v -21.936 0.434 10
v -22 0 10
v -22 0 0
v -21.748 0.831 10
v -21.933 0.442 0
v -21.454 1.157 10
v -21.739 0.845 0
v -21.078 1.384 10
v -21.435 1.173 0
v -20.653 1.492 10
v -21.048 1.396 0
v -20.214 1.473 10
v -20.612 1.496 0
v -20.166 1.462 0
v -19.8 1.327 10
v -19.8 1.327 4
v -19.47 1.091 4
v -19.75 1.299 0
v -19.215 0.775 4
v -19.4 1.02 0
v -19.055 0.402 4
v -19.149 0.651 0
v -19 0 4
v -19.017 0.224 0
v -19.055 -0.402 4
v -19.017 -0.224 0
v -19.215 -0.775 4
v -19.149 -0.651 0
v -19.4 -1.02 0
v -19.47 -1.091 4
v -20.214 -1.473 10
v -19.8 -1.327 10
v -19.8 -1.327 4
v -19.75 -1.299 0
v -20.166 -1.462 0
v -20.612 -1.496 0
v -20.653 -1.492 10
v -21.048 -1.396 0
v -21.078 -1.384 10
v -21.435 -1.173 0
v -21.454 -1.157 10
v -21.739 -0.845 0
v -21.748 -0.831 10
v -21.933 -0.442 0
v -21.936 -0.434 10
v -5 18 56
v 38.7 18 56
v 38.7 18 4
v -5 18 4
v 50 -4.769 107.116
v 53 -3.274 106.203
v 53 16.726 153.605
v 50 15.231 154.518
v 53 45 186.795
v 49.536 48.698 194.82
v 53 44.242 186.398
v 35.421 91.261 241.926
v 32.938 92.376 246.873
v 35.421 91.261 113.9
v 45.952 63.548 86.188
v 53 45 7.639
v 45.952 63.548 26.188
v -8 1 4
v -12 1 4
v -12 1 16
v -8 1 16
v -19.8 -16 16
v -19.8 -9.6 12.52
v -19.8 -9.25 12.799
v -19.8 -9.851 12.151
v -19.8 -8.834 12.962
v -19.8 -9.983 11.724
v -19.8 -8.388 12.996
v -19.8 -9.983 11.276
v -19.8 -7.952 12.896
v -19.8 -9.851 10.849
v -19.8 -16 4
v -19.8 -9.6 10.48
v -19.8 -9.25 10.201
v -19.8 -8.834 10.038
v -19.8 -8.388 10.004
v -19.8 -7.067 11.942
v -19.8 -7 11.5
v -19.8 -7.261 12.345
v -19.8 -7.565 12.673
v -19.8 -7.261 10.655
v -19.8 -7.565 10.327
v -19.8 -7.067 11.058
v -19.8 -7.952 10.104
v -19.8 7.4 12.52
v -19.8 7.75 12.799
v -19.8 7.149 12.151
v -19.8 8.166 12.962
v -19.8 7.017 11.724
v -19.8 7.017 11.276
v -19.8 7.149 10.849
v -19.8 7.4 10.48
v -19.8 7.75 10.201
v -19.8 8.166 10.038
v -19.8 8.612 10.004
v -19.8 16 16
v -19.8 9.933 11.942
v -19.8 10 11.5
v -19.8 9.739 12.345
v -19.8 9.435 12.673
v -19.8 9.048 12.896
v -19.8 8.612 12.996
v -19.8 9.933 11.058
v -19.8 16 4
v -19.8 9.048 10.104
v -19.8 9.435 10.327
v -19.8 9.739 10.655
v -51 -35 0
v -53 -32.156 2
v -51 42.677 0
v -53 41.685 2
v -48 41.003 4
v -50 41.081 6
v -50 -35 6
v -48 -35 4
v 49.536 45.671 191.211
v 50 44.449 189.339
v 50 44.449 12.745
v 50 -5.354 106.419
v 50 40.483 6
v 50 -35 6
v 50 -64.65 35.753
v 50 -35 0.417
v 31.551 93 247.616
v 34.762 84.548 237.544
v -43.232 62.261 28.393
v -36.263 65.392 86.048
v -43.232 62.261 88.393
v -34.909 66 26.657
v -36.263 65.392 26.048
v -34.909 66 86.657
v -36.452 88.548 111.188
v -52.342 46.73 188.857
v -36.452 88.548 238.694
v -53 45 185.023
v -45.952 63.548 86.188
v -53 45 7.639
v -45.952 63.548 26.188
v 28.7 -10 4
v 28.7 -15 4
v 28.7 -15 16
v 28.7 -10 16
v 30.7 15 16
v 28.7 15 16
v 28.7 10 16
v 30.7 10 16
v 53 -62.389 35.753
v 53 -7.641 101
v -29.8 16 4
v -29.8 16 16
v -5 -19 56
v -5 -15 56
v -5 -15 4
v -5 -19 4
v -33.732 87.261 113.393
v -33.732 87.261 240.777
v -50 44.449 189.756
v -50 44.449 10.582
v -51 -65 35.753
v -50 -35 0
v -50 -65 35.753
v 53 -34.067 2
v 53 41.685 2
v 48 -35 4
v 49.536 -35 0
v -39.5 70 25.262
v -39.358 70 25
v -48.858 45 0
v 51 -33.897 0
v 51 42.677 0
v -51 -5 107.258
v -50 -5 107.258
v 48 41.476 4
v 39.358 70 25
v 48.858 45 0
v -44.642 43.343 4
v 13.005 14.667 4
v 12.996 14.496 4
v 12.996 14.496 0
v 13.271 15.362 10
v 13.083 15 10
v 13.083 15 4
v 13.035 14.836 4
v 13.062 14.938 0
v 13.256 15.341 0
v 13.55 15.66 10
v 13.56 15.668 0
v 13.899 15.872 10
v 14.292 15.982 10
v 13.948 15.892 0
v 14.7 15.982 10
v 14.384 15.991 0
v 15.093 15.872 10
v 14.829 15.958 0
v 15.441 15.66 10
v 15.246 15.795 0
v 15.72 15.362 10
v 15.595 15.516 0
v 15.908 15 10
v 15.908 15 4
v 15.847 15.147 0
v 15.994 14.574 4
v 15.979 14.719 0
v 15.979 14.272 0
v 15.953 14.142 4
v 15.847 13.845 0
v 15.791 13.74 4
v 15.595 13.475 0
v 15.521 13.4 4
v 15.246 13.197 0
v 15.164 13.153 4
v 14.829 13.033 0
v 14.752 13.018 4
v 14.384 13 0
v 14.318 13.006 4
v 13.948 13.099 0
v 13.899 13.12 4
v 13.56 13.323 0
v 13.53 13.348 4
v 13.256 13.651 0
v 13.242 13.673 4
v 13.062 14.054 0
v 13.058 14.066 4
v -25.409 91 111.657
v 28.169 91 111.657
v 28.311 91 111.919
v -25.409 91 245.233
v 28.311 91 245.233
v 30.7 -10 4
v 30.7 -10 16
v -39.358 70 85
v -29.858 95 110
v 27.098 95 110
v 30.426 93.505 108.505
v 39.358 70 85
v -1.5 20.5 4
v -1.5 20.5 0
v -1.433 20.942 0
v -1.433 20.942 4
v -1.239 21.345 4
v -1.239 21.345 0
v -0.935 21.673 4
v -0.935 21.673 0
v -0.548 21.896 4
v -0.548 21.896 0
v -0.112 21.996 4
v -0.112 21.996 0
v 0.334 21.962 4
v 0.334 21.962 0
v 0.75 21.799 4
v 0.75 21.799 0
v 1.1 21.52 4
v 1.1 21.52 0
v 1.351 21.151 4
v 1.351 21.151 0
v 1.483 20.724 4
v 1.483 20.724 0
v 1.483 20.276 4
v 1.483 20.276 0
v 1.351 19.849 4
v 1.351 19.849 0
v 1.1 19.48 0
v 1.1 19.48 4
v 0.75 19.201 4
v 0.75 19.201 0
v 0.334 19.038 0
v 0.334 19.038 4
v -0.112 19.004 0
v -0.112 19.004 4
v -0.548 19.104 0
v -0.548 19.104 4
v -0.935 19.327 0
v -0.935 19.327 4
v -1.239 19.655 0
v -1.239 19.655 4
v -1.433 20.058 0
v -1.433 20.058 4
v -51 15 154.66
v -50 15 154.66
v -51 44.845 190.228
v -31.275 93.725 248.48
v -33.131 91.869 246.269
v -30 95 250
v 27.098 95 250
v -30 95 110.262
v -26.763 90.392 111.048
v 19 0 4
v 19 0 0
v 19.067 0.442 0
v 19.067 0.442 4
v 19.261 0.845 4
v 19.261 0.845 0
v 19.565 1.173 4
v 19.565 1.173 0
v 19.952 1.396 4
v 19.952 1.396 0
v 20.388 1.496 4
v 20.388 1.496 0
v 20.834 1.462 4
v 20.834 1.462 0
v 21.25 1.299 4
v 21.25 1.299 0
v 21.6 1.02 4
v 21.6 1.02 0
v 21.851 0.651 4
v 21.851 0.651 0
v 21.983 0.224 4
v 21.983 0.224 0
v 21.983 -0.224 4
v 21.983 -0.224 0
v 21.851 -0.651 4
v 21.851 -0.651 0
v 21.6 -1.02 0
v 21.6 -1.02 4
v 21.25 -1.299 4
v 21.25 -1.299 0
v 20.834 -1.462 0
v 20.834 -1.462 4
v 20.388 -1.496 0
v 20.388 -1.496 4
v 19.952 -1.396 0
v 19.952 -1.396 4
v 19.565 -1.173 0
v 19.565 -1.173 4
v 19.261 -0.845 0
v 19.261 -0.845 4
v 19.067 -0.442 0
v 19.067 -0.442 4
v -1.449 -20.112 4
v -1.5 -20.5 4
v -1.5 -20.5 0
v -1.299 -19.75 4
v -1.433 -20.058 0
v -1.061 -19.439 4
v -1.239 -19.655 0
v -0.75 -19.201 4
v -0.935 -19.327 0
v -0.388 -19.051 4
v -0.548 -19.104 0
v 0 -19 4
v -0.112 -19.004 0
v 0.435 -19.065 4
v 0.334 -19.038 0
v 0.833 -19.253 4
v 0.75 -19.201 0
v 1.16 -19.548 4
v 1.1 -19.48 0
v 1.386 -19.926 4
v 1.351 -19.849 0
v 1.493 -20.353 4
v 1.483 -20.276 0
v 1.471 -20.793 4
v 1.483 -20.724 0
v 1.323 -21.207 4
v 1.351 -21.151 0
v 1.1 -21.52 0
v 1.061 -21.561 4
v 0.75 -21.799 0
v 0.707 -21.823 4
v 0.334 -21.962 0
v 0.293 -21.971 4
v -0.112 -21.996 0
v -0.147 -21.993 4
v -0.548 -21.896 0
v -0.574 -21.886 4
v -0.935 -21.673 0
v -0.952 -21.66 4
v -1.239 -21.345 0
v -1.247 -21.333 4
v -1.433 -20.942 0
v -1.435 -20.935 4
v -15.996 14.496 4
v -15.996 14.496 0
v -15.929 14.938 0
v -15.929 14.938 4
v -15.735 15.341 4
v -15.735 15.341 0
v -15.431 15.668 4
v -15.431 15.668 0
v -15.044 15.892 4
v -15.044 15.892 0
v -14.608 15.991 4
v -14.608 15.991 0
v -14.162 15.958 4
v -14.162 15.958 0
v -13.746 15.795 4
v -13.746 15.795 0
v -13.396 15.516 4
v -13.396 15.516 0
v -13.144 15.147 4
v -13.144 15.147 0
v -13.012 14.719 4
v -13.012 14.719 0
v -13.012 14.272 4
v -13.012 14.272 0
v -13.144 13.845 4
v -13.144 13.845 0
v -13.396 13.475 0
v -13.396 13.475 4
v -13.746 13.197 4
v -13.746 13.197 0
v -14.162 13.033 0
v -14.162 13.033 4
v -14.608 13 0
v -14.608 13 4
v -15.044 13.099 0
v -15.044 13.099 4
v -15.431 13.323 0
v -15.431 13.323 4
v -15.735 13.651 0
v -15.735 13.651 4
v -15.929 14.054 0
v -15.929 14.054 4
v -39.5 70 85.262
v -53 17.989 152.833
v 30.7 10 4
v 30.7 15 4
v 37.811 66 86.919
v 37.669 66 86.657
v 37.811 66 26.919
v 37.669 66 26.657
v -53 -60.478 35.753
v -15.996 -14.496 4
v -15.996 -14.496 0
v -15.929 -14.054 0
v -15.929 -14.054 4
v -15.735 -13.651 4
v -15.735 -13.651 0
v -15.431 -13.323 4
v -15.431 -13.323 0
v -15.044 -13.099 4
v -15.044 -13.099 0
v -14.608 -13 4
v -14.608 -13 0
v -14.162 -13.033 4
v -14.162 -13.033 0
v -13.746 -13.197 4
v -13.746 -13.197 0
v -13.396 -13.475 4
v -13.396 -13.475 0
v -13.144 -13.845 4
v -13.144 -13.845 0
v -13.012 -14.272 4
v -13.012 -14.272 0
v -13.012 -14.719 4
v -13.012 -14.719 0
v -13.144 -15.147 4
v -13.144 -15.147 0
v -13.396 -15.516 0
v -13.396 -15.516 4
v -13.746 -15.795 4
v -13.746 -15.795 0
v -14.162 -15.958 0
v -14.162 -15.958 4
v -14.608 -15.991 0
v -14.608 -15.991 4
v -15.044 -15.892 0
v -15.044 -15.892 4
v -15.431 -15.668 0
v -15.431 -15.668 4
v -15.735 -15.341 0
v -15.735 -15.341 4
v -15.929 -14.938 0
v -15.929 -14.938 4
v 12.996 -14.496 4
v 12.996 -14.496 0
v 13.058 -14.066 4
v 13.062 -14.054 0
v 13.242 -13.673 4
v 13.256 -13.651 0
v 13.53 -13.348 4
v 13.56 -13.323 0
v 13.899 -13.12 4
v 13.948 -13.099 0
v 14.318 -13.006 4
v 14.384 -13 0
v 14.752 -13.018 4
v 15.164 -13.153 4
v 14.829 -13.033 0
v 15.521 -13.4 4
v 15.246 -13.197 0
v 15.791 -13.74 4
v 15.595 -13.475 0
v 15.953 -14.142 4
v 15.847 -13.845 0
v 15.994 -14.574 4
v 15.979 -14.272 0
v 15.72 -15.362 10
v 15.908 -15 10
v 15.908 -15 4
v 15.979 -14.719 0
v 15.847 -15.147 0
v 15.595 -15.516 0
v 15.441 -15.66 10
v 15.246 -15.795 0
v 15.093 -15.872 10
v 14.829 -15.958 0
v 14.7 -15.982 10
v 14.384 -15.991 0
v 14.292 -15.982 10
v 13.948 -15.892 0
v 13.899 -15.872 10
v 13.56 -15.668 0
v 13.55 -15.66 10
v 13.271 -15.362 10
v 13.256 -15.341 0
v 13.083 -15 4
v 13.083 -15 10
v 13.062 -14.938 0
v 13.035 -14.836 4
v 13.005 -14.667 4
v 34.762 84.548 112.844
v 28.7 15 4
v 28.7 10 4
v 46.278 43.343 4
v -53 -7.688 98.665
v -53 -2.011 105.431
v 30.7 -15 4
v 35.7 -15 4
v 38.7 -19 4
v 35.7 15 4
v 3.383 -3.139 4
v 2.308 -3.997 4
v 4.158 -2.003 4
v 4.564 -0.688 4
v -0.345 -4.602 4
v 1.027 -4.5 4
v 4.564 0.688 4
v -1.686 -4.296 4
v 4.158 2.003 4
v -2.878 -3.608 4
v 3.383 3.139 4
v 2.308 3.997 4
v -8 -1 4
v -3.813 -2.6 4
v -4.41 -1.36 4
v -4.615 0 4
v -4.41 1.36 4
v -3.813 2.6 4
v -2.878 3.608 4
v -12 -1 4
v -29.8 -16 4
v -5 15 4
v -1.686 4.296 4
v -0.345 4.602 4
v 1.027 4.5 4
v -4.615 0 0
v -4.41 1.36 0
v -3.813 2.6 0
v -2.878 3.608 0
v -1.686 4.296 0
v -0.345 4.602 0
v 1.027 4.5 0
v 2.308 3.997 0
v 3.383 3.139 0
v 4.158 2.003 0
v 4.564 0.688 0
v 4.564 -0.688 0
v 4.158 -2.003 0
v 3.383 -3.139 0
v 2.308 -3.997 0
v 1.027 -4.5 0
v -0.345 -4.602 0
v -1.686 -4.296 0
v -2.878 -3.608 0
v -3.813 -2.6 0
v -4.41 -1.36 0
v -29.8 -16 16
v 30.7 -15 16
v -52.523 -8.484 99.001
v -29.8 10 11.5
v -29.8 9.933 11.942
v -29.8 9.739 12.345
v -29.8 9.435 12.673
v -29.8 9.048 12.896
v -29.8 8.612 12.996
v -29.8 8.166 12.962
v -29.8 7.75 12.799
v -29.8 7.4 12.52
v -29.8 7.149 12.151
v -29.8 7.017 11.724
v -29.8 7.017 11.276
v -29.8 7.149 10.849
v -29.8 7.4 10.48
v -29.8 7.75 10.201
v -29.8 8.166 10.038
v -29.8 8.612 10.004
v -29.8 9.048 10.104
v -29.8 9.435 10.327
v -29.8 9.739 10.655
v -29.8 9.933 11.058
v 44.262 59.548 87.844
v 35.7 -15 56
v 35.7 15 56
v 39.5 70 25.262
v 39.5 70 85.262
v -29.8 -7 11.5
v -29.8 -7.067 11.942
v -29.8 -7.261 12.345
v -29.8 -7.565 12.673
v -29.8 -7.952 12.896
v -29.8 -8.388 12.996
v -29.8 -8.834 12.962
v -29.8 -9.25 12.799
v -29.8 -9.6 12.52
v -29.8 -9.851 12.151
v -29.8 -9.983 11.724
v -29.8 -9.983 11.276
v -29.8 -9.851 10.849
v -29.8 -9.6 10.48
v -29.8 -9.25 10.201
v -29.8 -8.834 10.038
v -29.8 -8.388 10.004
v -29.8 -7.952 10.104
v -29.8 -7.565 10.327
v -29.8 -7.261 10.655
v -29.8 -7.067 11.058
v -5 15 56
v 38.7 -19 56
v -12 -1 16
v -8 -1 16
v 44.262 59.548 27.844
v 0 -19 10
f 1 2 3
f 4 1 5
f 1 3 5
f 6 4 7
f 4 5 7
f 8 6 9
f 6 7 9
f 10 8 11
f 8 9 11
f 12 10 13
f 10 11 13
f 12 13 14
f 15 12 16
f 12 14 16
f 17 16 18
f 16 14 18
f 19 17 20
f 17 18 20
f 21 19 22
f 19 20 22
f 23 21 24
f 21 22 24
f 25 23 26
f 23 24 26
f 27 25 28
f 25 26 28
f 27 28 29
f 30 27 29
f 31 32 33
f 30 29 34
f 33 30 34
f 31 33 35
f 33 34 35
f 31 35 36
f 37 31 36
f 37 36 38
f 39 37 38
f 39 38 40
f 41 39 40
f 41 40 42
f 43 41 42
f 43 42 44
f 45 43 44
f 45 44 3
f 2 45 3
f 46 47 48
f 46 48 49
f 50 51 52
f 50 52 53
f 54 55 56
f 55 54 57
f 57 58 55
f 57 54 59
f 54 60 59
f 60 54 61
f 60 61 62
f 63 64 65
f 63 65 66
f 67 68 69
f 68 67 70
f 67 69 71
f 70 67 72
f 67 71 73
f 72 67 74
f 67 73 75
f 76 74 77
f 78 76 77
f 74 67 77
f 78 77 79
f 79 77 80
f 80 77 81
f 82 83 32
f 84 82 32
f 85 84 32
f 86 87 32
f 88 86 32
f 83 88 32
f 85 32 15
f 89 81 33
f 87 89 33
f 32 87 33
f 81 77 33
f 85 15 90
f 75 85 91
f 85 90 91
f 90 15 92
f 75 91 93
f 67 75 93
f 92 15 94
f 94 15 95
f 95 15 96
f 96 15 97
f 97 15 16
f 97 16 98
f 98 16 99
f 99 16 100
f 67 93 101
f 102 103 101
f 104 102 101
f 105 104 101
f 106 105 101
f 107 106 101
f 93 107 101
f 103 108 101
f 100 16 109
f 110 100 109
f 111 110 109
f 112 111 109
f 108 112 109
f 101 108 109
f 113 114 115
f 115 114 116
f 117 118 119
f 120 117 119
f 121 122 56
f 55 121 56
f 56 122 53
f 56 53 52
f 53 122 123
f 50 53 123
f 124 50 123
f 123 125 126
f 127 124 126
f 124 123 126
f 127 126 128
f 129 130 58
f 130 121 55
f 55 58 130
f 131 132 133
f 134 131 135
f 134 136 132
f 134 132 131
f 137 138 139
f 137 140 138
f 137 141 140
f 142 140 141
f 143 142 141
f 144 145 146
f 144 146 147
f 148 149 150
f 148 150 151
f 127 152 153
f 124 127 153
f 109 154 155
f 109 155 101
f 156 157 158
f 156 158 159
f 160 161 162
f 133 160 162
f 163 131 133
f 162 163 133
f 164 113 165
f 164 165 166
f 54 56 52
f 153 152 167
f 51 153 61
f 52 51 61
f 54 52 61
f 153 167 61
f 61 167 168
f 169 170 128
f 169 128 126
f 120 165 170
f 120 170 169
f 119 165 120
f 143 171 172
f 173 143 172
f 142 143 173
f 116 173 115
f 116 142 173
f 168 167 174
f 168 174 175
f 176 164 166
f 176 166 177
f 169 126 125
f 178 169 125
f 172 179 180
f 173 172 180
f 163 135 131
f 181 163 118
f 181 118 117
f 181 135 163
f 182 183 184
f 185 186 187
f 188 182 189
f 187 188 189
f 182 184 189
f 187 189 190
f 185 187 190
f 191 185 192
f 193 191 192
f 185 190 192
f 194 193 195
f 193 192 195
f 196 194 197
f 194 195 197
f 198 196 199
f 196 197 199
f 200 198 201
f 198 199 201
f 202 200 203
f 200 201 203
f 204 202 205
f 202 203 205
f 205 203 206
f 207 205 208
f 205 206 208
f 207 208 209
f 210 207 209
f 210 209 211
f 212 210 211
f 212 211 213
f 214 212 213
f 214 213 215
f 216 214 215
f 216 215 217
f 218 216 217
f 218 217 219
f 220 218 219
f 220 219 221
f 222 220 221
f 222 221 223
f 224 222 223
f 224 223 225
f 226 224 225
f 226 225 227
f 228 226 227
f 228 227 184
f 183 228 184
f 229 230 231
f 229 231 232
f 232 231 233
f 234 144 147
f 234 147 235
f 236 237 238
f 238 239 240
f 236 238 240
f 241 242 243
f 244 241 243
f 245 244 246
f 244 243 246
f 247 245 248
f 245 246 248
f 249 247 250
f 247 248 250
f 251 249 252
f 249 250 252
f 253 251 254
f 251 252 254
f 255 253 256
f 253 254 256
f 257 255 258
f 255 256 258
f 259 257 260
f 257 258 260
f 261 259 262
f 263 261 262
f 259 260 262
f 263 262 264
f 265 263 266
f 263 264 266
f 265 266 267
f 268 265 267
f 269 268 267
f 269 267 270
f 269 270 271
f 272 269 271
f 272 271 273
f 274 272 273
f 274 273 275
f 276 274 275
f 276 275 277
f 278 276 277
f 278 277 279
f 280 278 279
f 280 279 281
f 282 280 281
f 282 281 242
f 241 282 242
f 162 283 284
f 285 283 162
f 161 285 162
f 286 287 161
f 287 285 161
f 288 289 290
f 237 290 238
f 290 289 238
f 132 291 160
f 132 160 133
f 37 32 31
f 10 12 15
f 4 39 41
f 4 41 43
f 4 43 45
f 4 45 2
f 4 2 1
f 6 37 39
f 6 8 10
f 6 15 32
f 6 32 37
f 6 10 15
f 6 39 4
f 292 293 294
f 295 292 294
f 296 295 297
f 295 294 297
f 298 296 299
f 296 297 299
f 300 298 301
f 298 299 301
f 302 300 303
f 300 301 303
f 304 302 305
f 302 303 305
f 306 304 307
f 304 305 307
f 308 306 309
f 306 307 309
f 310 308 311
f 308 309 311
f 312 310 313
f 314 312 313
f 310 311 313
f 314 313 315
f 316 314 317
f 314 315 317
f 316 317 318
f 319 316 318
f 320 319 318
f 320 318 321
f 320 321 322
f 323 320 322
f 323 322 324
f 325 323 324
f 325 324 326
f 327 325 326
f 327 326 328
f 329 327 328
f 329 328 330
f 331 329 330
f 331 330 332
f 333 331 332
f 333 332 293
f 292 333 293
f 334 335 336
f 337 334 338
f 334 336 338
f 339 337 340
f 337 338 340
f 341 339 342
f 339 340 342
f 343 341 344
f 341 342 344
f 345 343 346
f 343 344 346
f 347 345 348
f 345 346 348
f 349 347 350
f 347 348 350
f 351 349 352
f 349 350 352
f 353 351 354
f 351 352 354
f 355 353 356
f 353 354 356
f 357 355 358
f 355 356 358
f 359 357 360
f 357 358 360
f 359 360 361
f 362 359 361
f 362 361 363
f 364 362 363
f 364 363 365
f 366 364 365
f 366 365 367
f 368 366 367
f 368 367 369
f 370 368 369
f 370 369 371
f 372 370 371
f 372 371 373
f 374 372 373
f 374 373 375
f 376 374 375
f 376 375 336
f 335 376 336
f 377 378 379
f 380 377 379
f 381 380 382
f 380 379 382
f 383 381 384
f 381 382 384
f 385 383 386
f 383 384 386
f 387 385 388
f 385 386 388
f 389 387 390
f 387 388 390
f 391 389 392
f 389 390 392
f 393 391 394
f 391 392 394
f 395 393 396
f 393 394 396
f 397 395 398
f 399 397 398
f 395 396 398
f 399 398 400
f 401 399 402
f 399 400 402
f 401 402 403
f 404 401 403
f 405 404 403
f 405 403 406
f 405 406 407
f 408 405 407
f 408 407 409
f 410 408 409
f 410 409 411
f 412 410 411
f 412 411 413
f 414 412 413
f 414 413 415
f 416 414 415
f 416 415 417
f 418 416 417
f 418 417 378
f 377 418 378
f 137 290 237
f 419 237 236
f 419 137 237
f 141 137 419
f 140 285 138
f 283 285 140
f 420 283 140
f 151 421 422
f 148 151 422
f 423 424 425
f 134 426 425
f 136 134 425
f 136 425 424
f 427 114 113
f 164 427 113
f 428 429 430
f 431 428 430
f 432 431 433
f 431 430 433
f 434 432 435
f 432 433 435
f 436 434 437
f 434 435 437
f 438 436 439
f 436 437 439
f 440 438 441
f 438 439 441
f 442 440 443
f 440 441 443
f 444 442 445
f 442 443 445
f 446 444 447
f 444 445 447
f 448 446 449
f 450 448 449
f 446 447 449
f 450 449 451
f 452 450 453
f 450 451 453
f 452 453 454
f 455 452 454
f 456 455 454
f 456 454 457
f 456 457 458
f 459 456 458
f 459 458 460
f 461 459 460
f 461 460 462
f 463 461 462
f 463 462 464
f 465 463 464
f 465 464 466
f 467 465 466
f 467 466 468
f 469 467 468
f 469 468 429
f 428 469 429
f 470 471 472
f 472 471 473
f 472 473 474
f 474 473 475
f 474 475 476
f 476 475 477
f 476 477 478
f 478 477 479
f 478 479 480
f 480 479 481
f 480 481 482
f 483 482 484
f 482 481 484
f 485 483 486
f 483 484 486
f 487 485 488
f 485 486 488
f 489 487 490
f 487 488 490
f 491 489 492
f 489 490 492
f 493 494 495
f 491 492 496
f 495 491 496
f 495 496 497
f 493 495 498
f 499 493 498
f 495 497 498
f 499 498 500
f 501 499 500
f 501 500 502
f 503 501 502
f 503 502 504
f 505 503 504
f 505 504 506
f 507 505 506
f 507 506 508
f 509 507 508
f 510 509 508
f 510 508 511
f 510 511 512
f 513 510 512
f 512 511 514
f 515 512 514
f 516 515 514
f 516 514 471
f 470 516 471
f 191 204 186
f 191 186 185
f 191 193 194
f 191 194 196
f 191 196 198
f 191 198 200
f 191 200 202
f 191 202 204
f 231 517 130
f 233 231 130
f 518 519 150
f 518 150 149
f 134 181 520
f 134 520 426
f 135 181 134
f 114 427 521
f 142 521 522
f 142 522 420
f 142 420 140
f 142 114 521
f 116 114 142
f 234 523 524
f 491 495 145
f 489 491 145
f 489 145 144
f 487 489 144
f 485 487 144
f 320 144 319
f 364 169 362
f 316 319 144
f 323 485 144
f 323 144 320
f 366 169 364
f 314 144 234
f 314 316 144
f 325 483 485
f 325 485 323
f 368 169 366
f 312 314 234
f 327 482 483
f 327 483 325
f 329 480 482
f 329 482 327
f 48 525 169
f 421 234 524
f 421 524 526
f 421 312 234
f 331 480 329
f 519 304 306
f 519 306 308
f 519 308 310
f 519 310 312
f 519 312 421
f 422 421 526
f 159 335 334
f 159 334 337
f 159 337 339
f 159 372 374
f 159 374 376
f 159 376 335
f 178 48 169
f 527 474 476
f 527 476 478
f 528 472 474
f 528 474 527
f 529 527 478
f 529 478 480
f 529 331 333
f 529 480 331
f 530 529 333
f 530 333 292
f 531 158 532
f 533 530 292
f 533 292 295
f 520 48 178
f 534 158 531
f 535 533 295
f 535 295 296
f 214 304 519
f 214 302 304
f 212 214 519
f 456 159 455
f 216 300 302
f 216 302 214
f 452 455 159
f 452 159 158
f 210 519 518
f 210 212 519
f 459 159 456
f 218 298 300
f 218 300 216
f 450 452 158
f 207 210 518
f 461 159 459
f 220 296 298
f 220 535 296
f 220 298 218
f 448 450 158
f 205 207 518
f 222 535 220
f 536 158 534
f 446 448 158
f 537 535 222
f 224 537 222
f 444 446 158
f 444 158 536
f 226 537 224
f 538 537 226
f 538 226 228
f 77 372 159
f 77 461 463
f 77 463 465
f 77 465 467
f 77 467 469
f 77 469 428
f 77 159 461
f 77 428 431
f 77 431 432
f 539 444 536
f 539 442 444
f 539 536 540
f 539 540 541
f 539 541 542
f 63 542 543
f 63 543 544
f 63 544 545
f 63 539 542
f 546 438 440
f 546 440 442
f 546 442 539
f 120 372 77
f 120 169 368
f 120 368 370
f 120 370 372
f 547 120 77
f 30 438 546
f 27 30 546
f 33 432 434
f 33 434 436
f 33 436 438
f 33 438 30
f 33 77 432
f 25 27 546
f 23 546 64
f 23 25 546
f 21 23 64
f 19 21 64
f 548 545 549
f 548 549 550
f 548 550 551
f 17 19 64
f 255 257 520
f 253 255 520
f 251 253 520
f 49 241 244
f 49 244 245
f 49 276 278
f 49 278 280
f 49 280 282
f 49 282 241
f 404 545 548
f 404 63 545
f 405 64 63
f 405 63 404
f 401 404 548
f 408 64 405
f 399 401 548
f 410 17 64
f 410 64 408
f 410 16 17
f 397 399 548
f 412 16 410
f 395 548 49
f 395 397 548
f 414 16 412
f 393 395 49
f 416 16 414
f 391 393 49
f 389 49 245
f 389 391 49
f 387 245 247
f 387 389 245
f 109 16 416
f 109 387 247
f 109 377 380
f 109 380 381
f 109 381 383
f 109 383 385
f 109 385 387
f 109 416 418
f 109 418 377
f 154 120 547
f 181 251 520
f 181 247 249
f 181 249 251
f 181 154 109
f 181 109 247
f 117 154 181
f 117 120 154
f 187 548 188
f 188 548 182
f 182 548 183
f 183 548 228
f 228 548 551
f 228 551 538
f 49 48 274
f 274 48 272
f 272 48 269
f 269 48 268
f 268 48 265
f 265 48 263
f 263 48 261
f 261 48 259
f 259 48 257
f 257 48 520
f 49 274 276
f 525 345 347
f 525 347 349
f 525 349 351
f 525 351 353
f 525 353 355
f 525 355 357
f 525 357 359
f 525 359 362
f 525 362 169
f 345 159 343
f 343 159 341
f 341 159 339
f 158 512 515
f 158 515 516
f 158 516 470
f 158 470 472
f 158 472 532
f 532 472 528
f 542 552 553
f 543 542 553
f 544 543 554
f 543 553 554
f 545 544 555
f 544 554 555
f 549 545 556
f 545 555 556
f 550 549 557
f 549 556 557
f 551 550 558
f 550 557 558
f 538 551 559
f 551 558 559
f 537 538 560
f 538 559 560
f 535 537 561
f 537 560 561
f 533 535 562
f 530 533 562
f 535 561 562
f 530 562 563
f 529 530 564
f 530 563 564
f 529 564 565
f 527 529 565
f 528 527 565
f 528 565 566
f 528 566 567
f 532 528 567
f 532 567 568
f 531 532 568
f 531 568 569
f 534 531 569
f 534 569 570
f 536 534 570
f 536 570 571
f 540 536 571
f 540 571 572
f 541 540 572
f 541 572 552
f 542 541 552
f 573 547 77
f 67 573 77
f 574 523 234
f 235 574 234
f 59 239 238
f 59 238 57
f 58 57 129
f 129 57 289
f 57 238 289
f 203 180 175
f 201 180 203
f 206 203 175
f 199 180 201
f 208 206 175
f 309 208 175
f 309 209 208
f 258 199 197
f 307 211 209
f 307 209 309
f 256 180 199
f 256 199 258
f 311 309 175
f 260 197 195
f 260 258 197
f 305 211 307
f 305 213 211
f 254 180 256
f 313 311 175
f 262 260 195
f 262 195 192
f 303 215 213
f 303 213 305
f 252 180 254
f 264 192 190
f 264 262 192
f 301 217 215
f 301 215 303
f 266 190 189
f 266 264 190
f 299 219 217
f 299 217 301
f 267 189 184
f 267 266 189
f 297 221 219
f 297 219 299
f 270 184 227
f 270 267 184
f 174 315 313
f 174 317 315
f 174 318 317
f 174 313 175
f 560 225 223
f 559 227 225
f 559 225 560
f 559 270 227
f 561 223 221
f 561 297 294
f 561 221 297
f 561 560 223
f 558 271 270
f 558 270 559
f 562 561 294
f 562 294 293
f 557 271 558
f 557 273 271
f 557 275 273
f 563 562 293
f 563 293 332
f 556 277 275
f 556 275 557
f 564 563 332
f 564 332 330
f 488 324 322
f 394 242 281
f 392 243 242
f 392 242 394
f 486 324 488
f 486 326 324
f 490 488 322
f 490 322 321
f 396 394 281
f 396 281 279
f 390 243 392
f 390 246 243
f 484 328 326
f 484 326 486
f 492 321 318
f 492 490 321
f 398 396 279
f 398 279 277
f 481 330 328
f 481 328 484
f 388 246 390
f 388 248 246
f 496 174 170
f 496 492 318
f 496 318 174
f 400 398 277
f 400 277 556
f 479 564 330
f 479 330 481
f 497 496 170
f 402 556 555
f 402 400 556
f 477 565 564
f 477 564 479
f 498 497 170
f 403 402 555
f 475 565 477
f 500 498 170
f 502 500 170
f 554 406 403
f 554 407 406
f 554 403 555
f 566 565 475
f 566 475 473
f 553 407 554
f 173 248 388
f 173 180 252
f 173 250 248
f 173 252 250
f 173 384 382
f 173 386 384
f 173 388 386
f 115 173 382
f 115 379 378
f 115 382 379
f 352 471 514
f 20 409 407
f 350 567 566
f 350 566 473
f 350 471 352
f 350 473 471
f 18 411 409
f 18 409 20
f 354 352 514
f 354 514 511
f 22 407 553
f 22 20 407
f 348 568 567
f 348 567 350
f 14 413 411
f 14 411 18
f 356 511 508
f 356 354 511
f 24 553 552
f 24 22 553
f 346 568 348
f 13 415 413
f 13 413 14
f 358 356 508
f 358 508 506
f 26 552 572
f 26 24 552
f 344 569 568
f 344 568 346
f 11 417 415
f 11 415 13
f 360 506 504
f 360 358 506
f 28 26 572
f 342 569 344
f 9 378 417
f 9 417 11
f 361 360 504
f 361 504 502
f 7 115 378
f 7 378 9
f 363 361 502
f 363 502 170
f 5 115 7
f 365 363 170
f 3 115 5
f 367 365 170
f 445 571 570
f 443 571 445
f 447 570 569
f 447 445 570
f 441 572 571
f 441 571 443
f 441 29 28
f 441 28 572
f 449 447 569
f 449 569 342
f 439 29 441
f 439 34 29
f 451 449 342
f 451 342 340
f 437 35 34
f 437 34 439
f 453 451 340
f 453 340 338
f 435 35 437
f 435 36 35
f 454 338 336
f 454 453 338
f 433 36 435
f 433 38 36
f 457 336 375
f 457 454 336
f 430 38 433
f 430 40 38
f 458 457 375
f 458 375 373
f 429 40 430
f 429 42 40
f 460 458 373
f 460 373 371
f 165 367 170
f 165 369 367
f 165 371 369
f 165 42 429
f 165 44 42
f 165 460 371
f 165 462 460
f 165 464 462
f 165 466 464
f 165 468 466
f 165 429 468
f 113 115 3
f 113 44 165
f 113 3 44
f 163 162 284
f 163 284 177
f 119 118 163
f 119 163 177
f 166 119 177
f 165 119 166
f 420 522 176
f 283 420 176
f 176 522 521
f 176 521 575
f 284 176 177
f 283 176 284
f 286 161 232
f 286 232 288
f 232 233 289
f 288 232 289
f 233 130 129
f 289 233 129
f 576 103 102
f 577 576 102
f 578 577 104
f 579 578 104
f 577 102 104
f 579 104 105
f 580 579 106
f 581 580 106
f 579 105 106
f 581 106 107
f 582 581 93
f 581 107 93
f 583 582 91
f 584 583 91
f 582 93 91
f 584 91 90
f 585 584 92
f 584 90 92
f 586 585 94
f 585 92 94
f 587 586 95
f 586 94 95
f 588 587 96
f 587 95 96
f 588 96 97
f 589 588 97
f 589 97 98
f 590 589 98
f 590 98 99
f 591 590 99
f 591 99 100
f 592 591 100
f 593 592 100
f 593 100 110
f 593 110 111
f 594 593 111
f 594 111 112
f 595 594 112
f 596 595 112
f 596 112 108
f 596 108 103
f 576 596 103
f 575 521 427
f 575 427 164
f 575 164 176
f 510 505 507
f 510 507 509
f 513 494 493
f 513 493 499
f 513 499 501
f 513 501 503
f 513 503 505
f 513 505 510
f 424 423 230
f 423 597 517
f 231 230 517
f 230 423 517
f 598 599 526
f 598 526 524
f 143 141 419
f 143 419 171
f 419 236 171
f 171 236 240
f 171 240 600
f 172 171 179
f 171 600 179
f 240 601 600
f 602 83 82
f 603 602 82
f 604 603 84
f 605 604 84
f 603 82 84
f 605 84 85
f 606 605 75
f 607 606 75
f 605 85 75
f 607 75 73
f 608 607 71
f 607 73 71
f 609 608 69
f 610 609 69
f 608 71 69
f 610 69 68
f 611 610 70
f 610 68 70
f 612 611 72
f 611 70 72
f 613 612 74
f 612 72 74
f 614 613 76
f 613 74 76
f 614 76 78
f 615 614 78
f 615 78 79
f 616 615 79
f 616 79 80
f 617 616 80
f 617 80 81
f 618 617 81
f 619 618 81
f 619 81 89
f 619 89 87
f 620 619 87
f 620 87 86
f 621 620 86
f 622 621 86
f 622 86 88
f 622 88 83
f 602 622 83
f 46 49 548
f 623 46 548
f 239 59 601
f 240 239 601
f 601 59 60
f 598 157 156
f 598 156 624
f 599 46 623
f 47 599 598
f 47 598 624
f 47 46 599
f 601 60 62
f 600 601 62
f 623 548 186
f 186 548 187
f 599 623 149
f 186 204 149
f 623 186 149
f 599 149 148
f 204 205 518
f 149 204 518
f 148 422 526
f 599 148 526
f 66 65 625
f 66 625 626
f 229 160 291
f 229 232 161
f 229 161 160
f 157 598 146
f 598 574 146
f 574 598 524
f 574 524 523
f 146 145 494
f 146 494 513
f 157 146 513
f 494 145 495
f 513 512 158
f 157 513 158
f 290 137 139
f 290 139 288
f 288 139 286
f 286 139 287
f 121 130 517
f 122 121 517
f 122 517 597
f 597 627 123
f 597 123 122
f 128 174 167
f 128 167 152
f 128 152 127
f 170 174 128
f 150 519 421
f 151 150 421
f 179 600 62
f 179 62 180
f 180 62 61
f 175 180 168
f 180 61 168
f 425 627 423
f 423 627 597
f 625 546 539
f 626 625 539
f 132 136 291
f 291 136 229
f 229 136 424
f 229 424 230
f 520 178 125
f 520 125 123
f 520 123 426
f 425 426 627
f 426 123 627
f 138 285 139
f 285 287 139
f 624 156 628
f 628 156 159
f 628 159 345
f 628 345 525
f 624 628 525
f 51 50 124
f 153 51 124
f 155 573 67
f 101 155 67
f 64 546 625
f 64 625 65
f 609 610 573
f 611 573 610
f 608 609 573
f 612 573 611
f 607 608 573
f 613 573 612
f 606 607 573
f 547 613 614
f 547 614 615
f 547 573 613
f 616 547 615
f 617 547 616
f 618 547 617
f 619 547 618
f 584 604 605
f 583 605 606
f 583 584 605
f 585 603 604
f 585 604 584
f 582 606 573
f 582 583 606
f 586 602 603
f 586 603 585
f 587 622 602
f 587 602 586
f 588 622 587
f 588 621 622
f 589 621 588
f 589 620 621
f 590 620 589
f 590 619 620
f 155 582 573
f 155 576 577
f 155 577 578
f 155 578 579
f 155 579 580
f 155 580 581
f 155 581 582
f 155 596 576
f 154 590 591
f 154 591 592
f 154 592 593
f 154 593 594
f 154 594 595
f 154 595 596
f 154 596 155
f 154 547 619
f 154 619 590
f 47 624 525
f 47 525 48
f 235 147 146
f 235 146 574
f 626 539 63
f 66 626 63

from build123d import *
from OCP.BRepFilletAPI import BRepFilletAPI_MakeChamfer

# Parameters (mm, degrees)
EXTRUDE_1_DEPTH          = 250
EXTRUDE_1_2_DEPTH        = 250
CUT_EXTRUDE_1_DEPTH      = 273.642623227
CUT_EXTRUDE_1_DEPTH_BACK = 273.642623227
EXTRUDE_5_REACH          = 274.643
EXTRUDE_6_REACH          = 274.643
EXTRUDE_13_DEPTH         = 52
SKETCH_15_W              = 2
SKETCH_15_H              = 5
SKETCH_15_W_2            = 4
SKETCH_15_H_2            = 2
EXTRUDE_14_DEPTH         = 12
SKETCH_16_W              = 10
SKETCH_16_H              = 32
EXTRUDE_15_DEPTH         = 12
CUT_EXTRUDE_2_REACH      = 279.173
SKETCH_17_R              = 1.5
SKETCH_18_R              = 1.5
SKETCH_18_R_2            = 4.615350253
CUT_EXTRUDE_3_DEPTH      = 10
CHAMFER_1_SIZE           = 3.464101615
CHAMFER_1_SIZE_2         = 2
CHAMFER_1_SIZE_3         = 2.416402179
CHAMFER_2_SIZE           = 4
CHAMFER_2_SIZE2          = 5.580634967
CHAMFER_2_SIZE2_2        = 6.901718256
CHAMFER_4_SIZE           = 2


with BuildPart() as part:
    # 草图2 → 凸台-拉伸1 (new body)
    with BuildSketch(Plane.XY):
        Polygon((-53, 45), (-34, 95), (-30.790701011, 95), (-50, 44.449213187), (-50, -65), (-53, -65), align=None)
    extrude(amount=EXTRUDE_1_DEPTH)


with BuildPart() as body_2:
    # 草图2 → Extrude 1 2 (new body)
    with BuildSketch(Plane.XY):
        Polygon((50, 44.449213187), (50, -65), (53, -65), (53, 45), (34, 95), (30.790701011, 95), align=None)
    extrude(amount=EXTRUDE_1_2_DEPTH)


with BuildPart() as cut_extrude_1_tool:
    # 草图3 → 切除-拉伸1 (new, two sides: drawn at the far end of the back side and taken through both)
    with BuildSketch(Plane(origin=(0, 0, 0), x_dir=(0, 0, -1), z_dir=(1, 0, 0)).offset(-CUT_EXTRUDE_1_DEPTH_BACK)):
        Polygon((0, -35), (-35.752607778, -65), (-107.257823333, -5), (-154.659712592, 15), (-250, 95), (-250, -65), (-250, -69.557889813), (0, -69.557889813), (0, -65), align=None)
        Polygon((-110, 95), (-85, 70), (-25, 70), (0, 45), (0, 95), align=None)
    extrude(amount=CUT_EXTRUDE_1_DEPTH + CUT_EXTRUDE_1_DEPTH_BACK)


with BuildPart() as part_1:
    add(part.part)

    # 切除-拉伸1: cut by cut_extrude_1_tool
    add(cut_extrude_1_tool.part, mode=Mode.SUBTRACT)

    # 草图5<2> → 凸台-拉伸6 (add, up to next)
    with BuildSketch(Plane(origin=(0, 0, 0), x_dir=(0, 0, -1), z_dir=(1, 0, 0)), mode=Mode.PRIVATE) as extrude_6_sk1:
        Polygon((-250, 95), (-110, 95), (-85, 70), (-25, 70), (0, 45), (0, -35), (-4, -35), (-4, 43.343145751), (-26.656854249, 66), (-86.656854249, 66), (-111.656854249, 91), (-245.23298563, 91), align=None)
    extrude_6_tool1 = extrude(extrude_6_sk1.sketch, amount=-EXTRUDE_6_REACH, mode=Mode.PRIVATE) - part_1.part


with BuildPart() as body_2_1:
    add(body_2.part)

    # 切除-拉伸1: cut by cut_extrude_1_tool
    add(cut_extrude_1_tool.part, mode=Mode.SUBTRACT)

    # 草图5 → 凸台-拉伸5 (add, up to next)
    with BuildSketch(Plane(origin=(0, 0, 0), x_dir=(0, 0, -1), z_dir=(1, 0, 0)), mode=Mode.PRIVATE) as extrude_5_sk1:
        Polygon((-250, 95), (-110, 95), (-85, 70), (-25, 70), (0, 45), (0, -35), (-4, -35), (-4, 43.343145751), (-26.656854249, 66), (-86.656854249, 66), (-111.656854249, 91), (-245.23298563, 91), align=None)
    extrude_5_tool1 = extrude(extrude_5_sk1.sketch, amount=EXTRUDE_5_REACH, mode=Mode.PRIVATE) - body_2_1.part
    add(extrude_5_tool1.solids().sort_by_distance((0, 92.182199, 180))[0])


with BuildPart() as part_2:
    add(part_1.part)

    add(body_2_1.part)  # 凸台-拉伸6 merges body 2
    add(extrude_6_tool1.solids().sort_by_distance((0, 92.182199, 180))[0])

    # 草图13 → 凸台-拉伸13 (add)
    with BuildSketch(Plane.XY.offset(4)):
        Polygon((-5, 15), (35.7, 15), (35.7, -15), (-5, -15), (-5, -19), (38.7, -19), (38.7, 18), (-5, 18), align=None)
    extrude(amount=EXTRUDE_13_DEPTH)

    # 草图15 → 凸台-拉伸14 (add)
    with BuildSketch(Plane.XY.offset(4)):
        with Locations((29.7, 12.5)):
            Rectangle(SKETCH_15_W, SKETCH_15_H)
        with Locations((29.7, -12.5)):
            Rectangle(SKETCH_15_W, SKETCH_15_H)
        with Locations((-10, 0)):
            Rectangle(SKETCH_15_W_2, SKETCH_15_H_2)
    extrude(amount=EXTRUDE_14_DEPTH)

    # 草图16 → 凸台-拉伸15 (add)
    with BuildSketch(Plane.XY.offset(4)):
        with Locations((-24.8, 0)):
            Rectangle(SKETCH_16_W, SKETCH_16_H)
    extrude(amount=EXTRUDE_15_DEPTH)

    # 草图17 → 切除-拉伸2 (cut, up to next)
    with BuildSketch(Plane(origin=(-19.8, 0, 0), x_dir=(0, 0, -1), z_dir=(1, 0, 0)), mode=Mode.PRIVATE) as cut_extrude_2_sk1:
        with Locations(Location((-11.5, 8.5, 0), (0, 0, 90))):
            Circle(SKETCH_17_R)
    cut_extrude_2_tool1 = extrude(cut_extrude_2_sk1.sketch, amount=-CUT_EXTRUDE_2_REACH, mode=Mode.PRIVATE) & part_2.part
    # 草图17 → 切除-拉伸2 (cut, up to next)
    with BuildSketch(Plane(origin=(-19.8, 0, 0), x_dir=(0, 0, -1), z_dir=(1, 0, 0)), mode=Mode.PRIVATE) as cut_extrude_2_sk2:
        with Locations(Location((-11.5, -8.5, 0), (0, 0, 90))):
            Circle(SKETCH_17_R)
    cut_extrude_2_tool2 = extrude(cut_extrude_2_sk2.sketch, amount=-CUT_EXTRUDE_2_REACH, mode=Mode.PRIVATE) & part_2.part
    add(cut_extrude_2_tool1.solids().sort_by_distance((-19.8, 8.5, 11.5))[0], mode=Mode.SUBTRACT)
    add(cut_extrude_2_tool2.solids().sort_by_distance((-19.8, -8.5, 11.5))[0], mode=Mode.SUBTRACT)

    # 草图18 → 切除-拉伸3 (cut)
    with BuildSketch(Plane(origin=(0, 0, 0), x_dir=(-1, 0, 0), z_dir=(0, 0, -1))):
        with Locations((20.5, 0)):
            Circle(SKETCH_18_R)
        with Locations((14.495689014, -14.495689014)):
            Circle(SKETCH_18_R)
        with Locations((0, -20.5)):
            Circle(SKETCH_18_R)
        with Locations((-14.495689014, -14.495689014)):
            Circle(SKETCH_18_R)
        with Locations((-20.5, 0)):
            Circle(SKETCH_18_R)
        with Locations((-14.495689014, 14.495689014)):
            Circle(SKETCH_18_R)
        with Locations((0, 20.5)):
            Circle(SKETCH_18_R)
        with Locations((14.495689014, 14.495689014)):
            Circle(SKETCH_18_R)
        Circle(SKETCH_18_R_2)
    extrude(amount=-CUT_EXTRUDE_3_DEPTH, mode=Mode.SUBTRACT)

    # 倒角1
    # the kernel refuses this chamfer: 3.464101615, 2.416402179, 2 mm, written as the material it takes off along each edge
    with BuildSketch(Plane(origin=(53, 9.239383761, 147.794477493), x_dir=(-1, 0, 0), z_dir=(0, 0.6427876096865404, 0.7660444431189771))) as chamfer_1_piece_1:
        Polygon((CHAMFER_1_SIZE, 0), (0, -CHAMFER_1_SIZE_2), (0, 0), align=None)
    extrude(amount=70.868920247, mode=Mode.SUBTRACT)
    with BuildSketch(Plane(origin=(53, -8.483850163, 99.000769351), x_dir=(-3.552713678800504e-15, 0.9213479550614352, -0.38873891714634334), z_dir=(0, 0.38873891714634334, 0.9213479550614352))) as chamfer_1_piece_2_section:
        Polygon((CHAMFER_1_SIZE_2, 0), (0, CHAMFER_1_SIZE), (0, 0), align=None)
    chamfer_1_piece_2 = extrude(amount=69.37226796, mode=Mode.PRIVATE)
    chamfer_1_piece_2 = split(chamfer_1_piece_2, bisect_by=Plane(origin=(53.276585969, -8.850832142, 99.308703795), z_dir=(0.49999999999999917, -0.663413948168938, 0.5566703992264205)), keep=Keep.TOP, mode=Mode.PRIVATE)
    add(chamfer_1_piece_2, mode=Mode.SUBTRACT)
    with BuildSketch(Plane(origin=(53, -70.760616239, 28.887372679), x_dir=(-3.5527136788004907e-15, 0.7660444431189773, -0.6427876096865404), z_dir=(0, 0.6427876096865404, 0.7660444431189772))) as chamfer_1_piece_3_section:
        Polygon((CHAMFER_1_SIZE_2, 0), (0, CHAMFER_1_SIZE), (0, 0), align=None)
    chamfer_1_piece_3 = extrude(amount=111.267285494, mode=Mode.PRIVATE)
    chamfer_1_piece_3 = split(chamfer_1_piece_3, bisect_by=Plane(origin=(39.090434661, -48.563433238, 19.521845967), z_dir=(0.49999999999999994, -0.7979107348080464, 0.33665777768838756)), keep=Keep.TOP, mode=Mode.PRIVATE)
    add(chamfer_1_piece_3, mode=Mode.SUBTRACT)
    with BuildSketch(Plane(origin=(53, -29.239383761, -6.865235099), x_dir=(0, 0.766044443118976, 0.6427876096865418), z_dir=(0, -0.6427876096865418, 0.766044443118976))) as chamfer_1_piece_4:
        Polygon((CHAMFER_1_SIZE_2, 0), (0, CHAMFER_1_SIZE), (0, 0), align=None)
    extrude(amount=64.595570688, mode=Mode.SUBTRACT)
    with BuildSketch(Plane(origin=(-53, 5.206952393, 142.988812924), x_dir=(1, 0, 0), z_dir=(0, 0.6427876096865404, 0.7660444431189771))) as chamfer_1_piece_5:
        Polygon((CHAMFER_1_SIZE_2, 0), (0, CHAMFER_1_SIZE), (0, 0), align=None)
    extrude(amount=70.868920247, mode=Mode.SUBTRACT)
    with BuildSketch(Plane(origin=(-53, -8.483850163, 99.000769351), x_dir=(0, 0.9213479550614352, -0.3887389171463434), z_dir=(0, 0.38873891714634334, 0.9213479550614352))) as chamfer_1_piece_6_section:
        Polygon((CHAMFER_1_SIZE, 0), (0, -CHAMFER_1_SIZE_2), (0, 0), align=None)
    chamfer_1_piece_6 = extrude(amount=75.645617519, mode=Mode.PRIVATE)
    chamfer_1_piece_6 = split(chamfer_1_piece_6, bisect_by=Plane(origin=(-52.642611372, -8.325785763, 98.868137571), z_dir=(-0.8660254037844394, -0.3830222215594882, 0.3213938048432697)), keep=Keep.TOP, mode=Mode.PRIVATE)
    add(chamfer_1_piece_6, mode=Mode.SUBTRACT)
    with BuildSketch(Plane(origin=(-53, -70.760616239, 28.887372679), x_dir=(0, 0.7660444431189772, -0.6427876096865404), z_dir=(0, 0.6427876096865404, 0.7660444431189772))) as chamfer_1_piece_7_section:
        Polygon((CHAMFER_1_SIZE, 0), (0, -CHAMFER_1_SIZE_2), (0, 0), align=None)
    chamfer_1_piece_7 = extrude(amount=111.267285494, mode=Mode.PRIVATE)
    chamfer_1_piece_7 = split(chamfer_1_piece_7, bisect_by=Plane(origin=(-38.456460064, -63.024318482, 25.623242123), z_dir=(-0.8660254037844407, -0.4606739775307143, 0.1943694585731703)), keep=Keep.TOP, mode=Mode.PRIVATE)
    add(chamfer_1_piece_7, mode=Mode.SUBTRACT)
    with BuildSketch(Plane(origin=(-53, -29.239383761, -6.865235099), x_dir=(0, 0.766044443118976, 0.6427876096865417), z_dir=(0, -0.6427876096865418, 0.766044443118976))) as chamfer_1_piece_8:
        Polygon((CHAMFER_1_SIZE, 0), (0, -CHAMFER_1_SIZE_2), (0, 0), align=None)
    extrude(amount=64.595570688, mode=Mode.SUBTRACT)
    # the kernel refuses this chamfer: 3.464101615, 2.416402179, 2 mm, written as the material it takes off along each edge
    with BuildSketch(Plane(origin=(56.90581755, 34.721532764, 178.162920115), x_dir=(-0.9714404796101728, -0.15252280601661522, -0.1817696020229335), z_dir=(-0.2372833634597202, 0.6244299038413693, 0.7441665812262069))) as chamfer_1_2_piece_1:
        Polygon((CHAMFER_1_SIZE_2, 0), (CHAMFER_1_SIZE_3 * 0.272112591588, -CHAMFER_1_SIZE_3 * 0.962265419331), (0, 0), align=None)
    extrude(amount=102.745515014, mode=Mode.SUBTRACT)
    with BuildSketch(Plane(origin=(-53.505772516, 43.669019695, 188.82611981), x_dir=(0.9714404796101727, -0.15252280601661541, -0.1817696020229337), z_dir=(0.23728336345972048, 0.6244299038413692, 0.7441665812262068))) as chamfer_1_2_piece_2:
        Polygon((CHAMFER_1_SIZE_2, 0), (CHAMFER_1_SIZE_3 * 0.272112591588, CHAMFER_1_SIZE_3 * 0.962265419331), (0, 0), align=None)
    extrude(amount=88.416465626, mode=Mode.SUBTRACT)

    # 倒角2: one chamfer whose edges measure the first distance from different faces: ONE call of the kernel's chamfer builder (chamfer() names one face for all edges)
    chamfer_2_edges_1 = [part_2.edges().sort_by_distance(p)[0] for p in [
        (45.905350506, 55.224606594, 15.881460843),
    ]]
    chamfer_2_side_1 = [part_2.faces().sort_by_distance(p)[0] for p in [
        (0, 54.321436841, 14.97829109),
    ]]
    chamfer_2_edges_2 = [part_2.edges().sort_by_distance(p)[0] for p in [
        (-45.905350506, 55.224606594, 15.881460843),
        (-37.060701011, 78.5, 99.156854249),
    ]]
    chamfer_2_side_2 = [part_2.faces().sort_by_distance(p)[0] for p in [
        (-41.912460378, 65.732212193, 134.225656141),
    ]]
    chamfer_2_edges_3 = [part_2.edges().sort_by_distance(p)[0] for p in [
        (41.810701011, 66, 56.656854249),
    ]]
    chamfer_2_side_3 = [part_2.faces().sort_by_distance(p)[0] for p in [
        (0, 66, 56.656854249),
    ]]
    chamfer_2_edges_4 = [part_2.edges().sort_by_distance(p)[0] for p in [
        (-41.810701011, 66, 56.656854249),
        (-32.310701011, 91, 178.44491994),
    ]]
    chamfer_2_side_4 = [part_2.faces().sort_by_distance(p)[0] for p in [
        (-41.912460378, 65.732212193, 134.225656141),
    ]]
    chamfer_2_edges_5 = [part_2.edges().sort_by_distance(p)[0] for p in [
        (37.060701011, 78.5, 99.156854249),
    ]]
    chamfer_2_side_5 = [part_2.faces().sort_by_distance(p)[0] for p in [
        (0, 77.965966209, 98.622820458),
    ]]
    chamfer_2_edges_6 = [part_2.edges().sort_by_distance(p)[0] for p in [
        (32.310701011, 91, 178.44491994),
    ]]
    chamfer_2_side_6 = [part_2.faces().sort_by_distance(p)[0] for p in [
        (0, 91, 178.44491994),
    ]]
    chamfer_2_edges_7 = [part_2.edges().sort_by_distance(p)[0] for p in [
        (-48.25, 57.5, 12.5),
        (48.25, 57.5, 12.5),
    ]]
    chamfer_2_side_7 = [part_2.faces().sort_by_distance(p)[0] for p in [
        (0, 57.089810017, 12.089810017),
    ]]
    chamfer_2_edges_8 = [part_2.edges().sort_by_distance(p)[0] for p in [
        (-43.5, 70, 55),
        (43.5, 70, 55),
    ]]
    chamfer_2_side_8 = [part_2.faces().sort_by_distance(p)[0] for p in [
        (0, 70, 55),
    ]]
    chamfer_2_edges_9 = [part_2.edges().sort_by_distance(p)[0] for p in [
        (-38.75, 82.5, 97.5),
        (38.75, 82.5, 97.5),
    ]]
    chamfer_2_side_9 = [part_2.faces().sort_by_distance(p)[0] for p in [
        (0, 81.989247312, 96.989247312),
    ]]
    chamfer_2_edges_10 = [part_2.edges().sort_by_distance(p)[0] for p in [
        (-34, 95, 178.191299722),
    ]]
    chamfer_2_side_10 = [part_2.faces().sort_by_distance(p)[0] for p in [
        (0, 95, 179.946140148),
    ]]
    chamfer_2_edges_11 = [part_2.edges().sort_by_distance(p)[0] for p in [
        (34, 95, 178.191299722),
    ]]
    chamfer_2_side_11 = [part_2.faces().sort_by_distance(p)[0] for p in [
        (44.287923043, 67.926518307, 130.959754024),
    ]]
    chamfer_2 = BRepFilletAPI_MakeChamfer(part_2.part.solid().wrapped)
    for e in chamfer_2_edges_1:
        chamfer_2.Add(CHAMFER_2_SIZE, CHAMFER_2_SIZE2, e.wrapped, chamfer_2_side_1[0].wrapped)  # the first distance lies on this face
    for e in chamfer_2_edges_2:
        chamfer_2.Add(CHAMFER_2_SIZE, CHAMFER_2_SIZE2, e.wrapped, chamfer_2_side_2[0].wrapped)  # the first distance lies on this face
    for e in chamfer_2_edges_3:
        chamfer_2.Add(CHAMFER_2_SIZE, CHAMFER_2_SIZE2_2, e.wrapped, chamfer_2_side_3[0].wrapped)  # the first distance lies on this face
    for e in chamfer_2_edges_4:
        chamfer_2.Add(CHAMFER_2_SIZE, CHAMFER_2_SIZE2_2, e.wrapped, chamfer_2_side_4[0].wrapped)  # the first distance lies on this face
    for e in chamfer_2_edges_5:
        chamfer_2.Add(CHAMFER_2_SIZE, CHAMFER_2_SIZE2, e.wrapped, chamfer_2_side_5[0].wrapped)  # the first distance lies on this face
    for e in chamfer_2_edges_6:
        chamfer_2.Add(CHAMFER_2_SIZE, CHAMFER_2_SIZE2_2, e.wrapped, chamfer_2_side_6[0].wrapped)  # the first distance lies on this face
    for e in chamfer_2_edges_7:
        chamfer_2.Add(CHAMFER_2_SIZE, CHAMFER_2_SIZE2, e.wrapped, chamfer_2_side_7[0].wrapped)  # the first distance lies on this face
    for e in chamfer_2_edges_8:
        chamfer_2.Add(CHAMFER_2_SIZE, CHAMFER_2_SIZE2_2, e.wrapped, chamfer_2_side_8[0].wrapped)  # the first distance lies on this face
    for e in chamfer_2_edges_9:
        chamfer_2.Add(CHAMFER_2_SIZE, CHAMFER_2_SIZE2, e.wrapped, chamfer_2_side_9[0].wrapped)  # the first distance lies on this face
    for e in chamfer_2_edges_10:
        chamfer_2.Add(CHAMFER_2_SIZE, CHAMFER_2_SIZE2_2, e.wrapped, chamfer_2_side_10[0].wrapped)  # the first distance lies on this face
    for e in chamfer_2_edges_11:
        chamfer_2.Add(CHAMFER_2_SIZE, CHAMFER_2_SIZE2_2, e.wrapped, chamfer_2_side_11[0].wrapped)  # the first distance lies on this face
    add(Compound.cast(chamfer_2.Shape()), mode=Mode.REPLACE)

    # 倒角4
    chamfer_4_edges = [part_2.edges().sort_by_distance(p)[0] for p in [
        (-50, 2.305035055, 4),
        (50, 2.153776079, 4),
        (-53, 5.015350076, 0),
        (53, 4.059725616, 0),
    ]]
    chamfer(chamfer_4_edges, length=CHAMFER_4_SIZE)


solid = part_2.part
